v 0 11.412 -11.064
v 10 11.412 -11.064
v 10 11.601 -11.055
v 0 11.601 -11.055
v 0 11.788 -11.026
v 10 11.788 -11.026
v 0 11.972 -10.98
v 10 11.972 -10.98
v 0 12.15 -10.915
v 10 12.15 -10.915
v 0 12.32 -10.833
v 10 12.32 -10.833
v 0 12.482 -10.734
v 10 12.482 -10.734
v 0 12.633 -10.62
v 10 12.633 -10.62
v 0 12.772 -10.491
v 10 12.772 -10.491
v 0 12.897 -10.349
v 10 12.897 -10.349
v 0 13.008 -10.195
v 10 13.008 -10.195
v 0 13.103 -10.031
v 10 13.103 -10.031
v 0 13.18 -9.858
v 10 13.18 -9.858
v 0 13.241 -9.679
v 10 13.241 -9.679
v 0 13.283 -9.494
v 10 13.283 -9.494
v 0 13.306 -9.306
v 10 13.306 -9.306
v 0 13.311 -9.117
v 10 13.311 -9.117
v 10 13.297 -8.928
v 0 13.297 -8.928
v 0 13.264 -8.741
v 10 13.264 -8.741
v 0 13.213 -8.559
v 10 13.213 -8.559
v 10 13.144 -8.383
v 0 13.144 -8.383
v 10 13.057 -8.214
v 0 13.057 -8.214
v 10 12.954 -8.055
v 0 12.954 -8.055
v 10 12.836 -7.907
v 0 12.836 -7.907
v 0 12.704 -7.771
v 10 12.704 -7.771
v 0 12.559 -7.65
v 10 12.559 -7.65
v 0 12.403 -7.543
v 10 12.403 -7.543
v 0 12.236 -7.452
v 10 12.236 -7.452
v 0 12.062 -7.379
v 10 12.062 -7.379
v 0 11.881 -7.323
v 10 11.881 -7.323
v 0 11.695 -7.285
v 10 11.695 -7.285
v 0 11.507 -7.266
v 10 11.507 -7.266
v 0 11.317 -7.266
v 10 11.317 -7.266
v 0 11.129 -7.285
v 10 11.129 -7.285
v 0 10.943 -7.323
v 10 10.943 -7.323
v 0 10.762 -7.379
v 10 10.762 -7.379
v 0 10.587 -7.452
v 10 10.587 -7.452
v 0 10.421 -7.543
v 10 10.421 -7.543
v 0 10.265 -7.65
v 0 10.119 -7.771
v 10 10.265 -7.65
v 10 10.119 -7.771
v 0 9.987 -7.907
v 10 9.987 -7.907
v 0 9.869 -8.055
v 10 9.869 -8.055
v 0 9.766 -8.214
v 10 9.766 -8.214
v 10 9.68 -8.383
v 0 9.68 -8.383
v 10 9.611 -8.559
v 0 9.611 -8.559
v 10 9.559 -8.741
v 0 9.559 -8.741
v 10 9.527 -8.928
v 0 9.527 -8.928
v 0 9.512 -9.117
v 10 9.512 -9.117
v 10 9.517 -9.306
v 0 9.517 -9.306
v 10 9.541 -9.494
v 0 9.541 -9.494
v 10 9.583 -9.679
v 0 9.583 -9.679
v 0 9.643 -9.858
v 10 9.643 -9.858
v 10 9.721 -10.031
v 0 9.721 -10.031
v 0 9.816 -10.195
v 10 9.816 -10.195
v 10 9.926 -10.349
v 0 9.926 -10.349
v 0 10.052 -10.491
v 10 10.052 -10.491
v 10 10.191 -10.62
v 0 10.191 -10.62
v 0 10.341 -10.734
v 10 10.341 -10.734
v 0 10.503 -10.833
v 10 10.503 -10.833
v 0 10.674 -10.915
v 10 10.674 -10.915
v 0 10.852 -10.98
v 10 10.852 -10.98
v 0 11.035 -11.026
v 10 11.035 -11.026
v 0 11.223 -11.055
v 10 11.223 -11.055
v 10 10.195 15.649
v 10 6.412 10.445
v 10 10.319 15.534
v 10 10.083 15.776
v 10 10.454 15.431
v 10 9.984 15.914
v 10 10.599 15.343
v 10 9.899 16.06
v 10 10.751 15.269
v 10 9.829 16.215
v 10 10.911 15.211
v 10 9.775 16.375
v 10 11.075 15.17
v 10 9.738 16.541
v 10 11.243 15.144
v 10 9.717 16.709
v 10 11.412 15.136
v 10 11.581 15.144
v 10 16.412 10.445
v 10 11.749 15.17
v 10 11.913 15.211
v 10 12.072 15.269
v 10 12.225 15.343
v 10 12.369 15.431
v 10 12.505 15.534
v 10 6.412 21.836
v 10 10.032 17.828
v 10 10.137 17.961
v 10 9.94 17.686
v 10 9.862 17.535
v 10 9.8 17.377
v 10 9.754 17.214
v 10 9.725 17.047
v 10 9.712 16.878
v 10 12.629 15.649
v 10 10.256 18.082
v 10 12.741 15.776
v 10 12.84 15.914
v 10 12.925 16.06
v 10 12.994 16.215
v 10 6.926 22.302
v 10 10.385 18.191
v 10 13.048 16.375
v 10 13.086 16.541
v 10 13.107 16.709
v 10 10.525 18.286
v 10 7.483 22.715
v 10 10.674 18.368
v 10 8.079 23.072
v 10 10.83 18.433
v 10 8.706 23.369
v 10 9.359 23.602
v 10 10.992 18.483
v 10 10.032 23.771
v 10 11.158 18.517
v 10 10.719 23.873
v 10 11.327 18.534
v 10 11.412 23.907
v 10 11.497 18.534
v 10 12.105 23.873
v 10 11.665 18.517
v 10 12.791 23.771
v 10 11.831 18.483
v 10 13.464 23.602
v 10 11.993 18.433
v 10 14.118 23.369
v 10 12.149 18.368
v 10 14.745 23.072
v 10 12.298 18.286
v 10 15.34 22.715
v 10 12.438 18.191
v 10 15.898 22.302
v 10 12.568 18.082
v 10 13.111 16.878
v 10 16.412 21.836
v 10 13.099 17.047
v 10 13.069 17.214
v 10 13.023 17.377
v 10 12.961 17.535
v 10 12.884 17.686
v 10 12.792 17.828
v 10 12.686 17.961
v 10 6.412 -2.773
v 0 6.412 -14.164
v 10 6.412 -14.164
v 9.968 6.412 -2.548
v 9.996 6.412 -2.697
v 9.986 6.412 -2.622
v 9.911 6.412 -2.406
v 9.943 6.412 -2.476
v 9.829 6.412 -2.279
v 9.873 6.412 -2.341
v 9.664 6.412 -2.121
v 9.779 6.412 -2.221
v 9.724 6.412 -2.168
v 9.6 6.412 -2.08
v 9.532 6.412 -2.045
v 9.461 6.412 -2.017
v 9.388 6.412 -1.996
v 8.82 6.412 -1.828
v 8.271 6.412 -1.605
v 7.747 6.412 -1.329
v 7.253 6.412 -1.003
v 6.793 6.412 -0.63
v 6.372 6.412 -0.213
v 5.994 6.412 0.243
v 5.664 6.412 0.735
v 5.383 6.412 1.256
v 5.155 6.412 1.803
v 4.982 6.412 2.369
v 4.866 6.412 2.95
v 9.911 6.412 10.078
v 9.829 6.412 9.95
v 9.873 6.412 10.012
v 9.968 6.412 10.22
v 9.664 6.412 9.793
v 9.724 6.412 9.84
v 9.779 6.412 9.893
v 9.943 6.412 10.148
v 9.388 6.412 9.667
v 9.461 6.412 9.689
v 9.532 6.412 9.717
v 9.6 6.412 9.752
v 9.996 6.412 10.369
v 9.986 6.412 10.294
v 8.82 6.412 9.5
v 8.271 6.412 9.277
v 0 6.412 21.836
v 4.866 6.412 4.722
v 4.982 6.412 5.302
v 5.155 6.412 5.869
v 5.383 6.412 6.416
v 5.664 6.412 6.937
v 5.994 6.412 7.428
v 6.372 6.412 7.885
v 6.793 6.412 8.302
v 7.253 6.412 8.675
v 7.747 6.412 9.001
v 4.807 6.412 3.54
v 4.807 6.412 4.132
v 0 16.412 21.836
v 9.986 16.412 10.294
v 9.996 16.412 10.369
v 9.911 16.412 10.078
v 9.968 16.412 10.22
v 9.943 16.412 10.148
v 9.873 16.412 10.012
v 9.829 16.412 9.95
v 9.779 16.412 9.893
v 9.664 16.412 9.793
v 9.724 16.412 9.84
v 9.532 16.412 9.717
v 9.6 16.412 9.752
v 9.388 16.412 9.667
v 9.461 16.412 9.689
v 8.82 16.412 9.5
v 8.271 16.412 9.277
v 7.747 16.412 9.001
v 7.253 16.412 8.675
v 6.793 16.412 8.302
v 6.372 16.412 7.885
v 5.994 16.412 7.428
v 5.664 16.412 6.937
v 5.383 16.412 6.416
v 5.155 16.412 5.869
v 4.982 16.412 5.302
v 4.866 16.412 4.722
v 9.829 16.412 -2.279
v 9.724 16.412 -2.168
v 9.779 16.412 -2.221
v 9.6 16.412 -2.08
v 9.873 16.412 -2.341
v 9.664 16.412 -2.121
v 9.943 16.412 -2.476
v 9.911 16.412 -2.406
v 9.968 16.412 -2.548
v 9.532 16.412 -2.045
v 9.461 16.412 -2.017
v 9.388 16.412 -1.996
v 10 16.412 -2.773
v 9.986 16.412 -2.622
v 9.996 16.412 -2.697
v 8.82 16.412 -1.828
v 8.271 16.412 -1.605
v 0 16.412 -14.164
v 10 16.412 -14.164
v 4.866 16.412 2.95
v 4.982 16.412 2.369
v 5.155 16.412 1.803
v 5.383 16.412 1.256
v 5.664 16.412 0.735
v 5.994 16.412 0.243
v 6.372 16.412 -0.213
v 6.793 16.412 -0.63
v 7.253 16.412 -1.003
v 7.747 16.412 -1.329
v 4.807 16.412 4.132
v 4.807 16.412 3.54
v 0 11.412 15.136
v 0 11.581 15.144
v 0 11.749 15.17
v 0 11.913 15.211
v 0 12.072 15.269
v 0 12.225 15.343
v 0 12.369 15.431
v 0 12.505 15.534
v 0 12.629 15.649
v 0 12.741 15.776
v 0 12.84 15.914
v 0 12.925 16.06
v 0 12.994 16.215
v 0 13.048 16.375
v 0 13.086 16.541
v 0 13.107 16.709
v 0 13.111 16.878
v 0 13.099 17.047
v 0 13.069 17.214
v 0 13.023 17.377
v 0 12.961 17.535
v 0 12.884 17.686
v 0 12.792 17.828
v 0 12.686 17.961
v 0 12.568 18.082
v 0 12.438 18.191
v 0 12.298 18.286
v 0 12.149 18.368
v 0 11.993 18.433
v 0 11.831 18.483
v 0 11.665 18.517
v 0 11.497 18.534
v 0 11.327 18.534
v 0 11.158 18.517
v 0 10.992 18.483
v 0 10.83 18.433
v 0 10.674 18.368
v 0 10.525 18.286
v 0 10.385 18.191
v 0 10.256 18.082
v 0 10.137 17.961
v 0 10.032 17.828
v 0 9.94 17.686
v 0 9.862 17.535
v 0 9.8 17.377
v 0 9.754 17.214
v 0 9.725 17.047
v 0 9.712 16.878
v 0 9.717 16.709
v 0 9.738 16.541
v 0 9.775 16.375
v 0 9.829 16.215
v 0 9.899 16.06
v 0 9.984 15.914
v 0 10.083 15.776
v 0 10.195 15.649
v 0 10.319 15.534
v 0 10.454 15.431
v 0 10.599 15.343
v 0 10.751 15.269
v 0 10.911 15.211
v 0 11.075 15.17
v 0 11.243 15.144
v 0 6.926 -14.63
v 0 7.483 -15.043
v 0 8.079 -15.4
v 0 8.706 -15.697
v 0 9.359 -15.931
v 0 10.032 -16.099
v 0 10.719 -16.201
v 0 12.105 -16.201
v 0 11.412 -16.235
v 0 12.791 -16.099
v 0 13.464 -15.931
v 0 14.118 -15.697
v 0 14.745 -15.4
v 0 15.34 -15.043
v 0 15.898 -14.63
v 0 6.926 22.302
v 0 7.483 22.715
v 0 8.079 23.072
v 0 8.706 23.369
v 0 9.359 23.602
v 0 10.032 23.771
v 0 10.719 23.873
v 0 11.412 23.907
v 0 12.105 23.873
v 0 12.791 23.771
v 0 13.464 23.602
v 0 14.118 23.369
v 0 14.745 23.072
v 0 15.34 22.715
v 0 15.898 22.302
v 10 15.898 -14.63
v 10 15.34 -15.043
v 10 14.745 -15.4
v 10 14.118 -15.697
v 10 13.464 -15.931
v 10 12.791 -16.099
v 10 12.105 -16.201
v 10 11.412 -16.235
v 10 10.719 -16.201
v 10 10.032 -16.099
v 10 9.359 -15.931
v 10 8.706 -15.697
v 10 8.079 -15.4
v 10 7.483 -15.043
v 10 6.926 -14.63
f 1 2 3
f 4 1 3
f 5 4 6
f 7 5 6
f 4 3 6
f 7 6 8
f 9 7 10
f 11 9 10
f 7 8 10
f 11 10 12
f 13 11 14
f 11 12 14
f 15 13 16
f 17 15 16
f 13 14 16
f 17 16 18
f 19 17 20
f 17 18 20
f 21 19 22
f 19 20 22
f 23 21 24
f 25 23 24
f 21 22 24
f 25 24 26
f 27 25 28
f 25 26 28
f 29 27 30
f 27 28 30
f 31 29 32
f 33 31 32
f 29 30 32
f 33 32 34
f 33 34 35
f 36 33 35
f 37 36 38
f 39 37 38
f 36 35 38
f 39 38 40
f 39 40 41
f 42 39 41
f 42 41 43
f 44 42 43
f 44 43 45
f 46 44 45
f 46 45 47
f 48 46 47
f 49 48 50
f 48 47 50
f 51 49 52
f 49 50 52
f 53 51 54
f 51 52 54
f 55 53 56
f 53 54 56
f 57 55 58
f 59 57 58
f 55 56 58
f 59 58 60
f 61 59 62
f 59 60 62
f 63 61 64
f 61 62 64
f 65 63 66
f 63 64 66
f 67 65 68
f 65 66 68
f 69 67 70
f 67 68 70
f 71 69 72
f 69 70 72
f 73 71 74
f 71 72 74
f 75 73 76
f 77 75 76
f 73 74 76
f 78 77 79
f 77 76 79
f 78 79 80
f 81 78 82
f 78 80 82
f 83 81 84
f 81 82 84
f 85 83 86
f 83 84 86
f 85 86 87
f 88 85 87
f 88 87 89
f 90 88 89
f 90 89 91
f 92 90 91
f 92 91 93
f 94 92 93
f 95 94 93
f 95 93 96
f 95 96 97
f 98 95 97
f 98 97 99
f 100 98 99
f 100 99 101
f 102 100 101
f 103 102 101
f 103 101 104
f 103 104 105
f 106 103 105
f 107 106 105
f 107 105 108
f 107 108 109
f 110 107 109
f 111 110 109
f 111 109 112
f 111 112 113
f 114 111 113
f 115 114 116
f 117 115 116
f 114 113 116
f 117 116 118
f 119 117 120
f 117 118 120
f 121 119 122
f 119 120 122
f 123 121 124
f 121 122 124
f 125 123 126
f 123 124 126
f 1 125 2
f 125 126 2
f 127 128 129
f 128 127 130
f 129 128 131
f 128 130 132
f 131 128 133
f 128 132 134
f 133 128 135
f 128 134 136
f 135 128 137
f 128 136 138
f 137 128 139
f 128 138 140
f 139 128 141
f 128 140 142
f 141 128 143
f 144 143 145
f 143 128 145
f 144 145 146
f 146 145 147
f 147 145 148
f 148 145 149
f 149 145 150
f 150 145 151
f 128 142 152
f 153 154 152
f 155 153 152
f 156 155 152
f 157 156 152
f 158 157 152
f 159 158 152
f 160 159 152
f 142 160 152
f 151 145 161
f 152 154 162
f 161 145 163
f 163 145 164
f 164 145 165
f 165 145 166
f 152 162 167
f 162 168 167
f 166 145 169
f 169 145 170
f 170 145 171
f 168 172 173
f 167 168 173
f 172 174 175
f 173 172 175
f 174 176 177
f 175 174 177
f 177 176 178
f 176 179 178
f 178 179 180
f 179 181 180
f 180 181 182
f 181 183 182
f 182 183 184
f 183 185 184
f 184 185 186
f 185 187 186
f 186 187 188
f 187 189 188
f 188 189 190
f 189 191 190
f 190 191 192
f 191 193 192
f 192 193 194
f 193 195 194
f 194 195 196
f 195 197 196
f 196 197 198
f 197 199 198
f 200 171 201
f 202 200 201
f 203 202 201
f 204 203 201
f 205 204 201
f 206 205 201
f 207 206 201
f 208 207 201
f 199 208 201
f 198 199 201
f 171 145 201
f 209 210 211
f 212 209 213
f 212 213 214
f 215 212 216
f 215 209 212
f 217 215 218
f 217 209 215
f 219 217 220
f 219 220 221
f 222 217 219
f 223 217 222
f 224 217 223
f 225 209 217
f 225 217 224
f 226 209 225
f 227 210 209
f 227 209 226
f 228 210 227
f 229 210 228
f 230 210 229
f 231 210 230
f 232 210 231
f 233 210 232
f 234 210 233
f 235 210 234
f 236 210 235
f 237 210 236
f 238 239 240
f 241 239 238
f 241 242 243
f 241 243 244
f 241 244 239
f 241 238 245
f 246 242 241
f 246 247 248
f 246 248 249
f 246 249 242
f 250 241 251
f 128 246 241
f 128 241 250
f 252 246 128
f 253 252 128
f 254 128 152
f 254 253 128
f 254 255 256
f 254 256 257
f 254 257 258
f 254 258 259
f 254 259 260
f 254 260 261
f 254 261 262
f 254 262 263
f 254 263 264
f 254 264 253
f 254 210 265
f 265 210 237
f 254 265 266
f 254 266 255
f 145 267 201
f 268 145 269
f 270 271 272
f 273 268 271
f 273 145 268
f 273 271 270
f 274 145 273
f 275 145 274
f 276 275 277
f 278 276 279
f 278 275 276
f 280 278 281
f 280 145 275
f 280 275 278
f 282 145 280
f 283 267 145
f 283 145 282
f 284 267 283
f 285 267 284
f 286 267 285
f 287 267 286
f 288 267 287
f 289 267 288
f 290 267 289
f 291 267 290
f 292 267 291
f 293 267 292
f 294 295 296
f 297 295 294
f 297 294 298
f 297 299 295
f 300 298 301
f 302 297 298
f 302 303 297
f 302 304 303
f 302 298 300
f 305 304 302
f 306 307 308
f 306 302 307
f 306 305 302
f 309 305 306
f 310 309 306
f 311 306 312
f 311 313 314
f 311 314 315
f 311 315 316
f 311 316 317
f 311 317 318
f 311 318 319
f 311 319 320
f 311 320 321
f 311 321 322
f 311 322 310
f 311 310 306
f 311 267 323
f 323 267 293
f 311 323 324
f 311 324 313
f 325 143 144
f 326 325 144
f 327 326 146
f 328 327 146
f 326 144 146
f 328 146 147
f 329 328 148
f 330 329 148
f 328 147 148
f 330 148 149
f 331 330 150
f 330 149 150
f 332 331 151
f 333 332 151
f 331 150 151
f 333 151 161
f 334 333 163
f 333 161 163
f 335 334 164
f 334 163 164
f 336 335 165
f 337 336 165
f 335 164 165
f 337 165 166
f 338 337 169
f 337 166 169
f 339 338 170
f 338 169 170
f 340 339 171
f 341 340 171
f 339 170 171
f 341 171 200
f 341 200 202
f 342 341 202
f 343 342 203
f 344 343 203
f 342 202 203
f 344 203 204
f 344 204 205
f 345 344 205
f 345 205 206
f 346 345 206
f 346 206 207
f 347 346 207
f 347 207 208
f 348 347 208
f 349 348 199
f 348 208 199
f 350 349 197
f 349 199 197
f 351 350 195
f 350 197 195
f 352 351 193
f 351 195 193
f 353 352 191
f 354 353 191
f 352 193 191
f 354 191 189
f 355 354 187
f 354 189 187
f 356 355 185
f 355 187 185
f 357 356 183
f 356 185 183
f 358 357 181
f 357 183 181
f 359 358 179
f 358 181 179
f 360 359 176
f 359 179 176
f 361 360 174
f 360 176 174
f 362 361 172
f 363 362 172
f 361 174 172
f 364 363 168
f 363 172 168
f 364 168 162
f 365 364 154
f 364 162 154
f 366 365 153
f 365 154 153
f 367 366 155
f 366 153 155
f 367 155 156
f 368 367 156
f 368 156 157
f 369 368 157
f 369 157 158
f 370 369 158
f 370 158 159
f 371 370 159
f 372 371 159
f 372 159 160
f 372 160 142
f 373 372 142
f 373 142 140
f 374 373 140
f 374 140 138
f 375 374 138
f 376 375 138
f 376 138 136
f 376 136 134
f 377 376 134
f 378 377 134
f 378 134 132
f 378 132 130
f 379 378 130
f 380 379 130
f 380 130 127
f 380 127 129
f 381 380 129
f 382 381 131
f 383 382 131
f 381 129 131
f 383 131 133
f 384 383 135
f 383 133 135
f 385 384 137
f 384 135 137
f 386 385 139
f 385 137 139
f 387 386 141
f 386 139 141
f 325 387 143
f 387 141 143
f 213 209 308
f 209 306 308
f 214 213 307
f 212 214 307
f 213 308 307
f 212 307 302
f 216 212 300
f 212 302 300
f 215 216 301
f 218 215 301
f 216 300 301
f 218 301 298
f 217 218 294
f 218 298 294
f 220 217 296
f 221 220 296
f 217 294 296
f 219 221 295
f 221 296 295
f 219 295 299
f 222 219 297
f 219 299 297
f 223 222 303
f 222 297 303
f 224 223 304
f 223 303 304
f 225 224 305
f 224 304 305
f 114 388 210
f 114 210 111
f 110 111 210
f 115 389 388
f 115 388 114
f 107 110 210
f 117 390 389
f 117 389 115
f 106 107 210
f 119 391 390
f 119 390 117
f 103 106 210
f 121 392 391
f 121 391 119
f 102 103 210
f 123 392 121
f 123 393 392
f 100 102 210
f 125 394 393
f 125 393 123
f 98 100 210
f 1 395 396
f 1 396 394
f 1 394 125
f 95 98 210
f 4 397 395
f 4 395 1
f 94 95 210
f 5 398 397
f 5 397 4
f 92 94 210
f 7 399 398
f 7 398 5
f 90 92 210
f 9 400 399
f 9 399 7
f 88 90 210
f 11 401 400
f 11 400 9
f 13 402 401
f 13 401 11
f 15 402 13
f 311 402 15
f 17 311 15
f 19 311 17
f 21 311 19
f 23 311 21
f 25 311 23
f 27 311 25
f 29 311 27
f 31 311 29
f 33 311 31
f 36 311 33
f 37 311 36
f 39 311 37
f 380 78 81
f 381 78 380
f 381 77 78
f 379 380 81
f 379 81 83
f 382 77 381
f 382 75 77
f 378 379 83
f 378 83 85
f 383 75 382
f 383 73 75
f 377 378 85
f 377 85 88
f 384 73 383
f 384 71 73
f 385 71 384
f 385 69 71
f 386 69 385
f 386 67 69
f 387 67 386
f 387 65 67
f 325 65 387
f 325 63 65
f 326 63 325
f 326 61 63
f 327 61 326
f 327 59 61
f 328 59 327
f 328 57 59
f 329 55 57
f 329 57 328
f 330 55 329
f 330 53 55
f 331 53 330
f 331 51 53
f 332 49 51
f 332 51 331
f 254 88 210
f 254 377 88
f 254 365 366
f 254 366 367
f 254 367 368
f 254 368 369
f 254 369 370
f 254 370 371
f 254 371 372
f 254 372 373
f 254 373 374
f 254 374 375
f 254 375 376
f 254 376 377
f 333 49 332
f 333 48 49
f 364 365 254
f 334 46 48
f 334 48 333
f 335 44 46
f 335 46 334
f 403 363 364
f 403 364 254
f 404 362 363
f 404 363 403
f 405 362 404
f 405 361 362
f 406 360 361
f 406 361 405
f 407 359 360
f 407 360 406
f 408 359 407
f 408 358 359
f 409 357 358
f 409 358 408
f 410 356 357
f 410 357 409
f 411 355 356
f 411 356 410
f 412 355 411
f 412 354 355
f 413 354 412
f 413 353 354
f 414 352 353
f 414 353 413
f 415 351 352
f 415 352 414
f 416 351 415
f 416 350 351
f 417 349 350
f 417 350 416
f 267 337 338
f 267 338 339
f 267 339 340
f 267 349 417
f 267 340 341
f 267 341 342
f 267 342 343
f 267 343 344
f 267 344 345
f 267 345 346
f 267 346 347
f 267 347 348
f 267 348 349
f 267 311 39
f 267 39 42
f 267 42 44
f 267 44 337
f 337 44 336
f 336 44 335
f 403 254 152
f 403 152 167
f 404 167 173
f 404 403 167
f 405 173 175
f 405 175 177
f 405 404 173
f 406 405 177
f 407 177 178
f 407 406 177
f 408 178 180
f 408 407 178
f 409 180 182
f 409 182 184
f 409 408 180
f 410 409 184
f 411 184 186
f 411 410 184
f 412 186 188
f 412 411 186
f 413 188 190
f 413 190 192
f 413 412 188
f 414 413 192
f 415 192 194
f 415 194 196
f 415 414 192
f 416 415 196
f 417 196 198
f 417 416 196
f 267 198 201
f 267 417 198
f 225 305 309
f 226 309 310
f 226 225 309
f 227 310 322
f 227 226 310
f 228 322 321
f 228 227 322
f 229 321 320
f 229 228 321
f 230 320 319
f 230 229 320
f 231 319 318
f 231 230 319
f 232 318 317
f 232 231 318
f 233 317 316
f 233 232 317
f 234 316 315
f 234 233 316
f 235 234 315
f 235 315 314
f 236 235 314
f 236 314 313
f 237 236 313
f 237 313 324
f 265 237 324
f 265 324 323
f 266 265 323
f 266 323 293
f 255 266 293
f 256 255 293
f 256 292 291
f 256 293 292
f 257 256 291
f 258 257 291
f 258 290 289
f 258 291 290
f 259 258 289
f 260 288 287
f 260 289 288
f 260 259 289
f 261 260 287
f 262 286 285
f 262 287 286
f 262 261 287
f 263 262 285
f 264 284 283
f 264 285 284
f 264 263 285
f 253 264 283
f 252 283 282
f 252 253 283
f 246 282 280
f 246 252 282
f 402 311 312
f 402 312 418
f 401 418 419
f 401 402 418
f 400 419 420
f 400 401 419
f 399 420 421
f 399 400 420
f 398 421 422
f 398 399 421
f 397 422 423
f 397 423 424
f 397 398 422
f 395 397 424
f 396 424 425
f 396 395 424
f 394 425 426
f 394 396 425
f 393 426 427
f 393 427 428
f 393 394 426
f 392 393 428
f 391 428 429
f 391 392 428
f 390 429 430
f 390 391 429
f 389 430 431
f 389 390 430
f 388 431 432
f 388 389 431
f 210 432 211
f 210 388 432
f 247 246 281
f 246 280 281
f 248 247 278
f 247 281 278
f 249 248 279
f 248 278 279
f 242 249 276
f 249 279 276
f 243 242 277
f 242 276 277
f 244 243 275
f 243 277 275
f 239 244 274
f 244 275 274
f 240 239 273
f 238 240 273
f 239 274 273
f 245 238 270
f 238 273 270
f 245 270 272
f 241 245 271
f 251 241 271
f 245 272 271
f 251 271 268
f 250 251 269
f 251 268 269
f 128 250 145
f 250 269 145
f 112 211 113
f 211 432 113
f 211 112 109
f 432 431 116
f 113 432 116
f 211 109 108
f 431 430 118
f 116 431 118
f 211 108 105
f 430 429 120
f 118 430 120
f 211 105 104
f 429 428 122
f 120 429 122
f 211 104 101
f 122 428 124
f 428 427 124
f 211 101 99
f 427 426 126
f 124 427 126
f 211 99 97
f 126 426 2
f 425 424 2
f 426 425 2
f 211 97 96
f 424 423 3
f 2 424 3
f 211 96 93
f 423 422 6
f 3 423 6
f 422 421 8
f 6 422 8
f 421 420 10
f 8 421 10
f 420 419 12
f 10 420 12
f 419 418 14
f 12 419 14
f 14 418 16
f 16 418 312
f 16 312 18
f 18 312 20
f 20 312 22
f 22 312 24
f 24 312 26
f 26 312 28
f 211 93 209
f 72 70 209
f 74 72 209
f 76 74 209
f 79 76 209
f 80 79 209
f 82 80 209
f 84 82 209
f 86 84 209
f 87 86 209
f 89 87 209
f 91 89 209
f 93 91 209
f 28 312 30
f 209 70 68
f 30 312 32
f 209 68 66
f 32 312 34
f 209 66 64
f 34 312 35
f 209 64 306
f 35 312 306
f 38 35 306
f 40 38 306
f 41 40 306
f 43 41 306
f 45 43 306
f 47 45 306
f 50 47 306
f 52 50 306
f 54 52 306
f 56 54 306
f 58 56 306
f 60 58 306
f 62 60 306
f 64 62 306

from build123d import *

# Parameters (mm, degrees)
EXTRUDE_1_DEPTH     = 10
CUT_EXTRUDE_1_DEPTH = 28.77666362
FILLET_1_R          = 0.8
SKETCH_3_R          = 1.7
SKETCH_3_R_2        = 1.9
CUT_EXTRUDE_2_DEPTH = 10


with BuildPart() as part:
    # 草图1 → 凸台-拉伸1 (new body)
    with BuildSketch(Plane(origin=(0, 0, 0), x_dir=(0, 0, -1), z_dir=(1, 0, 0))):
        with BuildLine():
            Line((-10.635898576, 16.411798263), (2.964101424, 16.411798263))
            Line((2.964101424, 16.411798263), (14.164101424, 16.411798263))
            ThreePointArc((14.164101424, 16.411798263), (16.235169236, 11.411798263), (14.164101424, 6.411798263))
            Line((14.164101424, 6.411798263), (2.964101424, 6.411798263))
            Line((2.964101424, 6.411798263), (-10.635898576, 6.411798263))
            Line((-10.635898576, 6.411798263), (-21.835898576, 6.411798263))
            ThreePointArc((-21.835898576, 6.411798263), (-23.906966388, 11.411798263), (-21.835898576, 16.411798263))
            Line((-21.835898576, 16.411798263), (-10.635898576, 16.411798263))
        make_face()
    extrude(amount=EXTRUDE_1_DEPTH)

    # 草图2 → 切除-拉伸1 (cut, through all)
    with BuildSketch(Plane.XZ.offset(-6.411798263)):
        with BuildLine():
            Line((10, 9.782326075), (10, -2.110528923))
            ThreePointArc((10, -2.110528923), (4.8, 3.835898576), (10, 9.782326075))
        make_face()
    extrude(amount=-CUT_EXTRUDE_1_DEPTH, mode=Mode.SUBTRACT)

    # 圆角1
    fillet_1_edges = [part.edges().sort_by_distance(p)[0] for p in [
        (10, 11.411798263, -2.110528923),
        (10, 11.411798263, 9.782326075),
    ]]
    fillet(fillet_1_edges, radius=FILLET_1_R)

    # 草图3 → 切除-拉伸2 (cut)
    with BuildSketch(Plane(origin=(10, 0, 0), x_dir=(0, 0, -1), z_dir=(1, 0, 0))):
        with Locations((-16.835898576, 11.411798263)):
            Circle(SKETCH_3_R)
        with Locations((9.164101424, 11.411798263)):
            Circle(SKETCH_3_R_2)
    extrude(amount=-CUT_EXTRUDE_2_DEPTH, mode=Mode.SUBTRACT)


solid = part.part
